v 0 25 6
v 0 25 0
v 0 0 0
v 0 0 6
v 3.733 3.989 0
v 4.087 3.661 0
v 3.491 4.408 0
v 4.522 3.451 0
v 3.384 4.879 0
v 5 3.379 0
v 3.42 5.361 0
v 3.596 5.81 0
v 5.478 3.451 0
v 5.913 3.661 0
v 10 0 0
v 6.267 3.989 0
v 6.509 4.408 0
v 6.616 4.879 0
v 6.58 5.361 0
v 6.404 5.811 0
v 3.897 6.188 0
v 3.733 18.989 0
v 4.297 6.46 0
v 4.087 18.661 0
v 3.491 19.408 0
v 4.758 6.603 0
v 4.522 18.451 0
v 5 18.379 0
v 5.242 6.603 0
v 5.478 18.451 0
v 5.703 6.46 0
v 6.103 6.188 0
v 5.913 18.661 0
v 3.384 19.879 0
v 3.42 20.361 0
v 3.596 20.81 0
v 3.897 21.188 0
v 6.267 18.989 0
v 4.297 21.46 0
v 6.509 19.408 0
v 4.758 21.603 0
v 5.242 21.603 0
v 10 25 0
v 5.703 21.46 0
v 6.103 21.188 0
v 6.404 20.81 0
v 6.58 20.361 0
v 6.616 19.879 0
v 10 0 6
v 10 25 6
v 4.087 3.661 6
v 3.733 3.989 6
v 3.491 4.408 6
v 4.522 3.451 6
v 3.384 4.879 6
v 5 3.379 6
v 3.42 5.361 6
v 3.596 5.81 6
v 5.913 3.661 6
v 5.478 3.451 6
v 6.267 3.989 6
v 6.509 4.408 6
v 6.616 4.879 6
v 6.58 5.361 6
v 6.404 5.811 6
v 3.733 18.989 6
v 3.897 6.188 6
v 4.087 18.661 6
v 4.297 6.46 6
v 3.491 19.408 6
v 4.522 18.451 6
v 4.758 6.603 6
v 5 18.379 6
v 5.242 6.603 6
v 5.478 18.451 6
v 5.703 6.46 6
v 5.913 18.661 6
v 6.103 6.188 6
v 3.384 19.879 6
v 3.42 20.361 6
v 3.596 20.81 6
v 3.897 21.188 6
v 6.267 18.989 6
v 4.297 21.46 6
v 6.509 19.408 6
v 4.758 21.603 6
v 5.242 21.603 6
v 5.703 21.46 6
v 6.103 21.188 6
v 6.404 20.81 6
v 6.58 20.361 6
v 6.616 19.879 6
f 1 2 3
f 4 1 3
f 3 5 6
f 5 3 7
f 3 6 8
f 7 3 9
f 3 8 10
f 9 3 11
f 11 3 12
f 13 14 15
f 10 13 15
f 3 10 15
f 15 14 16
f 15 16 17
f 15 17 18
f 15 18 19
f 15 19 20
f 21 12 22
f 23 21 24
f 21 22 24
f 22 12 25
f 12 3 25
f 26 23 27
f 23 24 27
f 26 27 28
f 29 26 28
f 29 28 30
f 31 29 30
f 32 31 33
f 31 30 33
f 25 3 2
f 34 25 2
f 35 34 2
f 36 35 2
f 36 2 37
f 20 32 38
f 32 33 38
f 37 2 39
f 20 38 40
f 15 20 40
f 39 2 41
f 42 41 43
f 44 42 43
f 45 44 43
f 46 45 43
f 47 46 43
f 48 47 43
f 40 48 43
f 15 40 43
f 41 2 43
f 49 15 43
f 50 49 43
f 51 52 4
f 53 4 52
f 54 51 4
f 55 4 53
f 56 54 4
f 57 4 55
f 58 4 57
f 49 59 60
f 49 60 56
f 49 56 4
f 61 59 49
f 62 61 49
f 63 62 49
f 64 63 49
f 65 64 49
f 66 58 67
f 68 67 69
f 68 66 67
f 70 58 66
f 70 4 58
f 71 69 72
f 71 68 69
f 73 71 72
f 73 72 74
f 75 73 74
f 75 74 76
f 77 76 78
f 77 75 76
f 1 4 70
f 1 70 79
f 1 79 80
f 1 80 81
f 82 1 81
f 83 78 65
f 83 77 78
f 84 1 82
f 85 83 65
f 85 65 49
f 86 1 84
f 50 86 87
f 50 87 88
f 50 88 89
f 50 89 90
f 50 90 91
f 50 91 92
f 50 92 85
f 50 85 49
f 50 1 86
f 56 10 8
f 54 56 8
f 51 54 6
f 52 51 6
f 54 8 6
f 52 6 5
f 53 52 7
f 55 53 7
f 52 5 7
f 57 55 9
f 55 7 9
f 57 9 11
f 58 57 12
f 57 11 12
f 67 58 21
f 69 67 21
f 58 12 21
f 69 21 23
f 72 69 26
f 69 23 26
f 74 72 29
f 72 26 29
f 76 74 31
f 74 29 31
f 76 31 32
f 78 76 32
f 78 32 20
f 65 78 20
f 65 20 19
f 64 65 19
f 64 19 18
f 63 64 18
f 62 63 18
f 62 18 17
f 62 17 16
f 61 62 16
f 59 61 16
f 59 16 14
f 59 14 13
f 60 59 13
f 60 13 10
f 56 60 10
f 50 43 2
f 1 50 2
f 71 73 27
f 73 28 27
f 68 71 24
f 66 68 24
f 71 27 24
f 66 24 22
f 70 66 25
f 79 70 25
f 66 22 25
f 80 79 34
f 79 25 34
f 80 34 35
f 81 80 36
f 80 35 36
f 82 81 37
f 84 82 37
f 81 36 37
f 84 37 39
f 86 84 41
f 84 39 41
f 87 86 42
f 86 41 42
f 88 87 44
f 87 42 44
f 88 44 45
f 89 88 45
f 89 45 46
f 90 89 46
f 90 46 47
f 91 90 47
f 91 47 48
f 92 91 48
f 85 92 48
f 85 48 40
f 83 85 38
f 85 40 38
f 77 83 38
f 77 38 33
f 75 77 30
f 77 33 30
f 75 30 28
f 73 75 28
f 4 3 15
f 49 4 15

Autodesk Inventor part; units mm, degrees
ref_plane "YZ Plane" through (0, 0, 0) normal (1, 0, 0) x (0, 1, 0)
ref_plane "XZ Plane" through (0, 0, 0) normal (0, 1, 0) x (-1, 0, 0)
ref_plane "XY Plane" through (0, 0, 0) normal (0, 0, 1) x (1, 0, 0)
sketch "Sketch1" plane through (0, 0, 0) normal (0, 0, 1) x (1, 0, 0)
  line L0 (0, 0) -> (10, 0)
  line L1 (10, 0) -> (10, 25)
  line L2 (10, 25) -> (0, 25)
  line L3 (0, 25) -> (0, 0)
  dimension "d0" = 10
  dimension "d1" = 25
extrude "Extrusion1" add sketch "Sketch1" along normal blind 6
sketch "Sketch2" plane through (0, 0, 6) normal (0, 0, 1) x (1, 0, 0)
  line L0 (10, 0) -> (10, 25) construction
  line L1 (10, 25) -> (0, 25) construction
  line L2 (0, 25) -> (0, 0) construction
  line L3 (0, 0) -> (10, 0) construction
  point P0 (5, 20)
  point P1 (5, 5)
  dimension "d4" = 5
  dimension "d5" = 10
  dimension "d6" = 5
  dimension "d7" = 5
  dimension "d15" = 15
hole "Hole1" at (5, 20, 6) at (5, 5, 6) direction (0, 0, -1) diameter 3.242 end through all thread size "M4x0.7" class "6H" standard "ISO Metric profile"
equation "\"d6\" = 0.5 * d5"
equation "\"d7\" = d6"
properties part number "Flange attach block"
